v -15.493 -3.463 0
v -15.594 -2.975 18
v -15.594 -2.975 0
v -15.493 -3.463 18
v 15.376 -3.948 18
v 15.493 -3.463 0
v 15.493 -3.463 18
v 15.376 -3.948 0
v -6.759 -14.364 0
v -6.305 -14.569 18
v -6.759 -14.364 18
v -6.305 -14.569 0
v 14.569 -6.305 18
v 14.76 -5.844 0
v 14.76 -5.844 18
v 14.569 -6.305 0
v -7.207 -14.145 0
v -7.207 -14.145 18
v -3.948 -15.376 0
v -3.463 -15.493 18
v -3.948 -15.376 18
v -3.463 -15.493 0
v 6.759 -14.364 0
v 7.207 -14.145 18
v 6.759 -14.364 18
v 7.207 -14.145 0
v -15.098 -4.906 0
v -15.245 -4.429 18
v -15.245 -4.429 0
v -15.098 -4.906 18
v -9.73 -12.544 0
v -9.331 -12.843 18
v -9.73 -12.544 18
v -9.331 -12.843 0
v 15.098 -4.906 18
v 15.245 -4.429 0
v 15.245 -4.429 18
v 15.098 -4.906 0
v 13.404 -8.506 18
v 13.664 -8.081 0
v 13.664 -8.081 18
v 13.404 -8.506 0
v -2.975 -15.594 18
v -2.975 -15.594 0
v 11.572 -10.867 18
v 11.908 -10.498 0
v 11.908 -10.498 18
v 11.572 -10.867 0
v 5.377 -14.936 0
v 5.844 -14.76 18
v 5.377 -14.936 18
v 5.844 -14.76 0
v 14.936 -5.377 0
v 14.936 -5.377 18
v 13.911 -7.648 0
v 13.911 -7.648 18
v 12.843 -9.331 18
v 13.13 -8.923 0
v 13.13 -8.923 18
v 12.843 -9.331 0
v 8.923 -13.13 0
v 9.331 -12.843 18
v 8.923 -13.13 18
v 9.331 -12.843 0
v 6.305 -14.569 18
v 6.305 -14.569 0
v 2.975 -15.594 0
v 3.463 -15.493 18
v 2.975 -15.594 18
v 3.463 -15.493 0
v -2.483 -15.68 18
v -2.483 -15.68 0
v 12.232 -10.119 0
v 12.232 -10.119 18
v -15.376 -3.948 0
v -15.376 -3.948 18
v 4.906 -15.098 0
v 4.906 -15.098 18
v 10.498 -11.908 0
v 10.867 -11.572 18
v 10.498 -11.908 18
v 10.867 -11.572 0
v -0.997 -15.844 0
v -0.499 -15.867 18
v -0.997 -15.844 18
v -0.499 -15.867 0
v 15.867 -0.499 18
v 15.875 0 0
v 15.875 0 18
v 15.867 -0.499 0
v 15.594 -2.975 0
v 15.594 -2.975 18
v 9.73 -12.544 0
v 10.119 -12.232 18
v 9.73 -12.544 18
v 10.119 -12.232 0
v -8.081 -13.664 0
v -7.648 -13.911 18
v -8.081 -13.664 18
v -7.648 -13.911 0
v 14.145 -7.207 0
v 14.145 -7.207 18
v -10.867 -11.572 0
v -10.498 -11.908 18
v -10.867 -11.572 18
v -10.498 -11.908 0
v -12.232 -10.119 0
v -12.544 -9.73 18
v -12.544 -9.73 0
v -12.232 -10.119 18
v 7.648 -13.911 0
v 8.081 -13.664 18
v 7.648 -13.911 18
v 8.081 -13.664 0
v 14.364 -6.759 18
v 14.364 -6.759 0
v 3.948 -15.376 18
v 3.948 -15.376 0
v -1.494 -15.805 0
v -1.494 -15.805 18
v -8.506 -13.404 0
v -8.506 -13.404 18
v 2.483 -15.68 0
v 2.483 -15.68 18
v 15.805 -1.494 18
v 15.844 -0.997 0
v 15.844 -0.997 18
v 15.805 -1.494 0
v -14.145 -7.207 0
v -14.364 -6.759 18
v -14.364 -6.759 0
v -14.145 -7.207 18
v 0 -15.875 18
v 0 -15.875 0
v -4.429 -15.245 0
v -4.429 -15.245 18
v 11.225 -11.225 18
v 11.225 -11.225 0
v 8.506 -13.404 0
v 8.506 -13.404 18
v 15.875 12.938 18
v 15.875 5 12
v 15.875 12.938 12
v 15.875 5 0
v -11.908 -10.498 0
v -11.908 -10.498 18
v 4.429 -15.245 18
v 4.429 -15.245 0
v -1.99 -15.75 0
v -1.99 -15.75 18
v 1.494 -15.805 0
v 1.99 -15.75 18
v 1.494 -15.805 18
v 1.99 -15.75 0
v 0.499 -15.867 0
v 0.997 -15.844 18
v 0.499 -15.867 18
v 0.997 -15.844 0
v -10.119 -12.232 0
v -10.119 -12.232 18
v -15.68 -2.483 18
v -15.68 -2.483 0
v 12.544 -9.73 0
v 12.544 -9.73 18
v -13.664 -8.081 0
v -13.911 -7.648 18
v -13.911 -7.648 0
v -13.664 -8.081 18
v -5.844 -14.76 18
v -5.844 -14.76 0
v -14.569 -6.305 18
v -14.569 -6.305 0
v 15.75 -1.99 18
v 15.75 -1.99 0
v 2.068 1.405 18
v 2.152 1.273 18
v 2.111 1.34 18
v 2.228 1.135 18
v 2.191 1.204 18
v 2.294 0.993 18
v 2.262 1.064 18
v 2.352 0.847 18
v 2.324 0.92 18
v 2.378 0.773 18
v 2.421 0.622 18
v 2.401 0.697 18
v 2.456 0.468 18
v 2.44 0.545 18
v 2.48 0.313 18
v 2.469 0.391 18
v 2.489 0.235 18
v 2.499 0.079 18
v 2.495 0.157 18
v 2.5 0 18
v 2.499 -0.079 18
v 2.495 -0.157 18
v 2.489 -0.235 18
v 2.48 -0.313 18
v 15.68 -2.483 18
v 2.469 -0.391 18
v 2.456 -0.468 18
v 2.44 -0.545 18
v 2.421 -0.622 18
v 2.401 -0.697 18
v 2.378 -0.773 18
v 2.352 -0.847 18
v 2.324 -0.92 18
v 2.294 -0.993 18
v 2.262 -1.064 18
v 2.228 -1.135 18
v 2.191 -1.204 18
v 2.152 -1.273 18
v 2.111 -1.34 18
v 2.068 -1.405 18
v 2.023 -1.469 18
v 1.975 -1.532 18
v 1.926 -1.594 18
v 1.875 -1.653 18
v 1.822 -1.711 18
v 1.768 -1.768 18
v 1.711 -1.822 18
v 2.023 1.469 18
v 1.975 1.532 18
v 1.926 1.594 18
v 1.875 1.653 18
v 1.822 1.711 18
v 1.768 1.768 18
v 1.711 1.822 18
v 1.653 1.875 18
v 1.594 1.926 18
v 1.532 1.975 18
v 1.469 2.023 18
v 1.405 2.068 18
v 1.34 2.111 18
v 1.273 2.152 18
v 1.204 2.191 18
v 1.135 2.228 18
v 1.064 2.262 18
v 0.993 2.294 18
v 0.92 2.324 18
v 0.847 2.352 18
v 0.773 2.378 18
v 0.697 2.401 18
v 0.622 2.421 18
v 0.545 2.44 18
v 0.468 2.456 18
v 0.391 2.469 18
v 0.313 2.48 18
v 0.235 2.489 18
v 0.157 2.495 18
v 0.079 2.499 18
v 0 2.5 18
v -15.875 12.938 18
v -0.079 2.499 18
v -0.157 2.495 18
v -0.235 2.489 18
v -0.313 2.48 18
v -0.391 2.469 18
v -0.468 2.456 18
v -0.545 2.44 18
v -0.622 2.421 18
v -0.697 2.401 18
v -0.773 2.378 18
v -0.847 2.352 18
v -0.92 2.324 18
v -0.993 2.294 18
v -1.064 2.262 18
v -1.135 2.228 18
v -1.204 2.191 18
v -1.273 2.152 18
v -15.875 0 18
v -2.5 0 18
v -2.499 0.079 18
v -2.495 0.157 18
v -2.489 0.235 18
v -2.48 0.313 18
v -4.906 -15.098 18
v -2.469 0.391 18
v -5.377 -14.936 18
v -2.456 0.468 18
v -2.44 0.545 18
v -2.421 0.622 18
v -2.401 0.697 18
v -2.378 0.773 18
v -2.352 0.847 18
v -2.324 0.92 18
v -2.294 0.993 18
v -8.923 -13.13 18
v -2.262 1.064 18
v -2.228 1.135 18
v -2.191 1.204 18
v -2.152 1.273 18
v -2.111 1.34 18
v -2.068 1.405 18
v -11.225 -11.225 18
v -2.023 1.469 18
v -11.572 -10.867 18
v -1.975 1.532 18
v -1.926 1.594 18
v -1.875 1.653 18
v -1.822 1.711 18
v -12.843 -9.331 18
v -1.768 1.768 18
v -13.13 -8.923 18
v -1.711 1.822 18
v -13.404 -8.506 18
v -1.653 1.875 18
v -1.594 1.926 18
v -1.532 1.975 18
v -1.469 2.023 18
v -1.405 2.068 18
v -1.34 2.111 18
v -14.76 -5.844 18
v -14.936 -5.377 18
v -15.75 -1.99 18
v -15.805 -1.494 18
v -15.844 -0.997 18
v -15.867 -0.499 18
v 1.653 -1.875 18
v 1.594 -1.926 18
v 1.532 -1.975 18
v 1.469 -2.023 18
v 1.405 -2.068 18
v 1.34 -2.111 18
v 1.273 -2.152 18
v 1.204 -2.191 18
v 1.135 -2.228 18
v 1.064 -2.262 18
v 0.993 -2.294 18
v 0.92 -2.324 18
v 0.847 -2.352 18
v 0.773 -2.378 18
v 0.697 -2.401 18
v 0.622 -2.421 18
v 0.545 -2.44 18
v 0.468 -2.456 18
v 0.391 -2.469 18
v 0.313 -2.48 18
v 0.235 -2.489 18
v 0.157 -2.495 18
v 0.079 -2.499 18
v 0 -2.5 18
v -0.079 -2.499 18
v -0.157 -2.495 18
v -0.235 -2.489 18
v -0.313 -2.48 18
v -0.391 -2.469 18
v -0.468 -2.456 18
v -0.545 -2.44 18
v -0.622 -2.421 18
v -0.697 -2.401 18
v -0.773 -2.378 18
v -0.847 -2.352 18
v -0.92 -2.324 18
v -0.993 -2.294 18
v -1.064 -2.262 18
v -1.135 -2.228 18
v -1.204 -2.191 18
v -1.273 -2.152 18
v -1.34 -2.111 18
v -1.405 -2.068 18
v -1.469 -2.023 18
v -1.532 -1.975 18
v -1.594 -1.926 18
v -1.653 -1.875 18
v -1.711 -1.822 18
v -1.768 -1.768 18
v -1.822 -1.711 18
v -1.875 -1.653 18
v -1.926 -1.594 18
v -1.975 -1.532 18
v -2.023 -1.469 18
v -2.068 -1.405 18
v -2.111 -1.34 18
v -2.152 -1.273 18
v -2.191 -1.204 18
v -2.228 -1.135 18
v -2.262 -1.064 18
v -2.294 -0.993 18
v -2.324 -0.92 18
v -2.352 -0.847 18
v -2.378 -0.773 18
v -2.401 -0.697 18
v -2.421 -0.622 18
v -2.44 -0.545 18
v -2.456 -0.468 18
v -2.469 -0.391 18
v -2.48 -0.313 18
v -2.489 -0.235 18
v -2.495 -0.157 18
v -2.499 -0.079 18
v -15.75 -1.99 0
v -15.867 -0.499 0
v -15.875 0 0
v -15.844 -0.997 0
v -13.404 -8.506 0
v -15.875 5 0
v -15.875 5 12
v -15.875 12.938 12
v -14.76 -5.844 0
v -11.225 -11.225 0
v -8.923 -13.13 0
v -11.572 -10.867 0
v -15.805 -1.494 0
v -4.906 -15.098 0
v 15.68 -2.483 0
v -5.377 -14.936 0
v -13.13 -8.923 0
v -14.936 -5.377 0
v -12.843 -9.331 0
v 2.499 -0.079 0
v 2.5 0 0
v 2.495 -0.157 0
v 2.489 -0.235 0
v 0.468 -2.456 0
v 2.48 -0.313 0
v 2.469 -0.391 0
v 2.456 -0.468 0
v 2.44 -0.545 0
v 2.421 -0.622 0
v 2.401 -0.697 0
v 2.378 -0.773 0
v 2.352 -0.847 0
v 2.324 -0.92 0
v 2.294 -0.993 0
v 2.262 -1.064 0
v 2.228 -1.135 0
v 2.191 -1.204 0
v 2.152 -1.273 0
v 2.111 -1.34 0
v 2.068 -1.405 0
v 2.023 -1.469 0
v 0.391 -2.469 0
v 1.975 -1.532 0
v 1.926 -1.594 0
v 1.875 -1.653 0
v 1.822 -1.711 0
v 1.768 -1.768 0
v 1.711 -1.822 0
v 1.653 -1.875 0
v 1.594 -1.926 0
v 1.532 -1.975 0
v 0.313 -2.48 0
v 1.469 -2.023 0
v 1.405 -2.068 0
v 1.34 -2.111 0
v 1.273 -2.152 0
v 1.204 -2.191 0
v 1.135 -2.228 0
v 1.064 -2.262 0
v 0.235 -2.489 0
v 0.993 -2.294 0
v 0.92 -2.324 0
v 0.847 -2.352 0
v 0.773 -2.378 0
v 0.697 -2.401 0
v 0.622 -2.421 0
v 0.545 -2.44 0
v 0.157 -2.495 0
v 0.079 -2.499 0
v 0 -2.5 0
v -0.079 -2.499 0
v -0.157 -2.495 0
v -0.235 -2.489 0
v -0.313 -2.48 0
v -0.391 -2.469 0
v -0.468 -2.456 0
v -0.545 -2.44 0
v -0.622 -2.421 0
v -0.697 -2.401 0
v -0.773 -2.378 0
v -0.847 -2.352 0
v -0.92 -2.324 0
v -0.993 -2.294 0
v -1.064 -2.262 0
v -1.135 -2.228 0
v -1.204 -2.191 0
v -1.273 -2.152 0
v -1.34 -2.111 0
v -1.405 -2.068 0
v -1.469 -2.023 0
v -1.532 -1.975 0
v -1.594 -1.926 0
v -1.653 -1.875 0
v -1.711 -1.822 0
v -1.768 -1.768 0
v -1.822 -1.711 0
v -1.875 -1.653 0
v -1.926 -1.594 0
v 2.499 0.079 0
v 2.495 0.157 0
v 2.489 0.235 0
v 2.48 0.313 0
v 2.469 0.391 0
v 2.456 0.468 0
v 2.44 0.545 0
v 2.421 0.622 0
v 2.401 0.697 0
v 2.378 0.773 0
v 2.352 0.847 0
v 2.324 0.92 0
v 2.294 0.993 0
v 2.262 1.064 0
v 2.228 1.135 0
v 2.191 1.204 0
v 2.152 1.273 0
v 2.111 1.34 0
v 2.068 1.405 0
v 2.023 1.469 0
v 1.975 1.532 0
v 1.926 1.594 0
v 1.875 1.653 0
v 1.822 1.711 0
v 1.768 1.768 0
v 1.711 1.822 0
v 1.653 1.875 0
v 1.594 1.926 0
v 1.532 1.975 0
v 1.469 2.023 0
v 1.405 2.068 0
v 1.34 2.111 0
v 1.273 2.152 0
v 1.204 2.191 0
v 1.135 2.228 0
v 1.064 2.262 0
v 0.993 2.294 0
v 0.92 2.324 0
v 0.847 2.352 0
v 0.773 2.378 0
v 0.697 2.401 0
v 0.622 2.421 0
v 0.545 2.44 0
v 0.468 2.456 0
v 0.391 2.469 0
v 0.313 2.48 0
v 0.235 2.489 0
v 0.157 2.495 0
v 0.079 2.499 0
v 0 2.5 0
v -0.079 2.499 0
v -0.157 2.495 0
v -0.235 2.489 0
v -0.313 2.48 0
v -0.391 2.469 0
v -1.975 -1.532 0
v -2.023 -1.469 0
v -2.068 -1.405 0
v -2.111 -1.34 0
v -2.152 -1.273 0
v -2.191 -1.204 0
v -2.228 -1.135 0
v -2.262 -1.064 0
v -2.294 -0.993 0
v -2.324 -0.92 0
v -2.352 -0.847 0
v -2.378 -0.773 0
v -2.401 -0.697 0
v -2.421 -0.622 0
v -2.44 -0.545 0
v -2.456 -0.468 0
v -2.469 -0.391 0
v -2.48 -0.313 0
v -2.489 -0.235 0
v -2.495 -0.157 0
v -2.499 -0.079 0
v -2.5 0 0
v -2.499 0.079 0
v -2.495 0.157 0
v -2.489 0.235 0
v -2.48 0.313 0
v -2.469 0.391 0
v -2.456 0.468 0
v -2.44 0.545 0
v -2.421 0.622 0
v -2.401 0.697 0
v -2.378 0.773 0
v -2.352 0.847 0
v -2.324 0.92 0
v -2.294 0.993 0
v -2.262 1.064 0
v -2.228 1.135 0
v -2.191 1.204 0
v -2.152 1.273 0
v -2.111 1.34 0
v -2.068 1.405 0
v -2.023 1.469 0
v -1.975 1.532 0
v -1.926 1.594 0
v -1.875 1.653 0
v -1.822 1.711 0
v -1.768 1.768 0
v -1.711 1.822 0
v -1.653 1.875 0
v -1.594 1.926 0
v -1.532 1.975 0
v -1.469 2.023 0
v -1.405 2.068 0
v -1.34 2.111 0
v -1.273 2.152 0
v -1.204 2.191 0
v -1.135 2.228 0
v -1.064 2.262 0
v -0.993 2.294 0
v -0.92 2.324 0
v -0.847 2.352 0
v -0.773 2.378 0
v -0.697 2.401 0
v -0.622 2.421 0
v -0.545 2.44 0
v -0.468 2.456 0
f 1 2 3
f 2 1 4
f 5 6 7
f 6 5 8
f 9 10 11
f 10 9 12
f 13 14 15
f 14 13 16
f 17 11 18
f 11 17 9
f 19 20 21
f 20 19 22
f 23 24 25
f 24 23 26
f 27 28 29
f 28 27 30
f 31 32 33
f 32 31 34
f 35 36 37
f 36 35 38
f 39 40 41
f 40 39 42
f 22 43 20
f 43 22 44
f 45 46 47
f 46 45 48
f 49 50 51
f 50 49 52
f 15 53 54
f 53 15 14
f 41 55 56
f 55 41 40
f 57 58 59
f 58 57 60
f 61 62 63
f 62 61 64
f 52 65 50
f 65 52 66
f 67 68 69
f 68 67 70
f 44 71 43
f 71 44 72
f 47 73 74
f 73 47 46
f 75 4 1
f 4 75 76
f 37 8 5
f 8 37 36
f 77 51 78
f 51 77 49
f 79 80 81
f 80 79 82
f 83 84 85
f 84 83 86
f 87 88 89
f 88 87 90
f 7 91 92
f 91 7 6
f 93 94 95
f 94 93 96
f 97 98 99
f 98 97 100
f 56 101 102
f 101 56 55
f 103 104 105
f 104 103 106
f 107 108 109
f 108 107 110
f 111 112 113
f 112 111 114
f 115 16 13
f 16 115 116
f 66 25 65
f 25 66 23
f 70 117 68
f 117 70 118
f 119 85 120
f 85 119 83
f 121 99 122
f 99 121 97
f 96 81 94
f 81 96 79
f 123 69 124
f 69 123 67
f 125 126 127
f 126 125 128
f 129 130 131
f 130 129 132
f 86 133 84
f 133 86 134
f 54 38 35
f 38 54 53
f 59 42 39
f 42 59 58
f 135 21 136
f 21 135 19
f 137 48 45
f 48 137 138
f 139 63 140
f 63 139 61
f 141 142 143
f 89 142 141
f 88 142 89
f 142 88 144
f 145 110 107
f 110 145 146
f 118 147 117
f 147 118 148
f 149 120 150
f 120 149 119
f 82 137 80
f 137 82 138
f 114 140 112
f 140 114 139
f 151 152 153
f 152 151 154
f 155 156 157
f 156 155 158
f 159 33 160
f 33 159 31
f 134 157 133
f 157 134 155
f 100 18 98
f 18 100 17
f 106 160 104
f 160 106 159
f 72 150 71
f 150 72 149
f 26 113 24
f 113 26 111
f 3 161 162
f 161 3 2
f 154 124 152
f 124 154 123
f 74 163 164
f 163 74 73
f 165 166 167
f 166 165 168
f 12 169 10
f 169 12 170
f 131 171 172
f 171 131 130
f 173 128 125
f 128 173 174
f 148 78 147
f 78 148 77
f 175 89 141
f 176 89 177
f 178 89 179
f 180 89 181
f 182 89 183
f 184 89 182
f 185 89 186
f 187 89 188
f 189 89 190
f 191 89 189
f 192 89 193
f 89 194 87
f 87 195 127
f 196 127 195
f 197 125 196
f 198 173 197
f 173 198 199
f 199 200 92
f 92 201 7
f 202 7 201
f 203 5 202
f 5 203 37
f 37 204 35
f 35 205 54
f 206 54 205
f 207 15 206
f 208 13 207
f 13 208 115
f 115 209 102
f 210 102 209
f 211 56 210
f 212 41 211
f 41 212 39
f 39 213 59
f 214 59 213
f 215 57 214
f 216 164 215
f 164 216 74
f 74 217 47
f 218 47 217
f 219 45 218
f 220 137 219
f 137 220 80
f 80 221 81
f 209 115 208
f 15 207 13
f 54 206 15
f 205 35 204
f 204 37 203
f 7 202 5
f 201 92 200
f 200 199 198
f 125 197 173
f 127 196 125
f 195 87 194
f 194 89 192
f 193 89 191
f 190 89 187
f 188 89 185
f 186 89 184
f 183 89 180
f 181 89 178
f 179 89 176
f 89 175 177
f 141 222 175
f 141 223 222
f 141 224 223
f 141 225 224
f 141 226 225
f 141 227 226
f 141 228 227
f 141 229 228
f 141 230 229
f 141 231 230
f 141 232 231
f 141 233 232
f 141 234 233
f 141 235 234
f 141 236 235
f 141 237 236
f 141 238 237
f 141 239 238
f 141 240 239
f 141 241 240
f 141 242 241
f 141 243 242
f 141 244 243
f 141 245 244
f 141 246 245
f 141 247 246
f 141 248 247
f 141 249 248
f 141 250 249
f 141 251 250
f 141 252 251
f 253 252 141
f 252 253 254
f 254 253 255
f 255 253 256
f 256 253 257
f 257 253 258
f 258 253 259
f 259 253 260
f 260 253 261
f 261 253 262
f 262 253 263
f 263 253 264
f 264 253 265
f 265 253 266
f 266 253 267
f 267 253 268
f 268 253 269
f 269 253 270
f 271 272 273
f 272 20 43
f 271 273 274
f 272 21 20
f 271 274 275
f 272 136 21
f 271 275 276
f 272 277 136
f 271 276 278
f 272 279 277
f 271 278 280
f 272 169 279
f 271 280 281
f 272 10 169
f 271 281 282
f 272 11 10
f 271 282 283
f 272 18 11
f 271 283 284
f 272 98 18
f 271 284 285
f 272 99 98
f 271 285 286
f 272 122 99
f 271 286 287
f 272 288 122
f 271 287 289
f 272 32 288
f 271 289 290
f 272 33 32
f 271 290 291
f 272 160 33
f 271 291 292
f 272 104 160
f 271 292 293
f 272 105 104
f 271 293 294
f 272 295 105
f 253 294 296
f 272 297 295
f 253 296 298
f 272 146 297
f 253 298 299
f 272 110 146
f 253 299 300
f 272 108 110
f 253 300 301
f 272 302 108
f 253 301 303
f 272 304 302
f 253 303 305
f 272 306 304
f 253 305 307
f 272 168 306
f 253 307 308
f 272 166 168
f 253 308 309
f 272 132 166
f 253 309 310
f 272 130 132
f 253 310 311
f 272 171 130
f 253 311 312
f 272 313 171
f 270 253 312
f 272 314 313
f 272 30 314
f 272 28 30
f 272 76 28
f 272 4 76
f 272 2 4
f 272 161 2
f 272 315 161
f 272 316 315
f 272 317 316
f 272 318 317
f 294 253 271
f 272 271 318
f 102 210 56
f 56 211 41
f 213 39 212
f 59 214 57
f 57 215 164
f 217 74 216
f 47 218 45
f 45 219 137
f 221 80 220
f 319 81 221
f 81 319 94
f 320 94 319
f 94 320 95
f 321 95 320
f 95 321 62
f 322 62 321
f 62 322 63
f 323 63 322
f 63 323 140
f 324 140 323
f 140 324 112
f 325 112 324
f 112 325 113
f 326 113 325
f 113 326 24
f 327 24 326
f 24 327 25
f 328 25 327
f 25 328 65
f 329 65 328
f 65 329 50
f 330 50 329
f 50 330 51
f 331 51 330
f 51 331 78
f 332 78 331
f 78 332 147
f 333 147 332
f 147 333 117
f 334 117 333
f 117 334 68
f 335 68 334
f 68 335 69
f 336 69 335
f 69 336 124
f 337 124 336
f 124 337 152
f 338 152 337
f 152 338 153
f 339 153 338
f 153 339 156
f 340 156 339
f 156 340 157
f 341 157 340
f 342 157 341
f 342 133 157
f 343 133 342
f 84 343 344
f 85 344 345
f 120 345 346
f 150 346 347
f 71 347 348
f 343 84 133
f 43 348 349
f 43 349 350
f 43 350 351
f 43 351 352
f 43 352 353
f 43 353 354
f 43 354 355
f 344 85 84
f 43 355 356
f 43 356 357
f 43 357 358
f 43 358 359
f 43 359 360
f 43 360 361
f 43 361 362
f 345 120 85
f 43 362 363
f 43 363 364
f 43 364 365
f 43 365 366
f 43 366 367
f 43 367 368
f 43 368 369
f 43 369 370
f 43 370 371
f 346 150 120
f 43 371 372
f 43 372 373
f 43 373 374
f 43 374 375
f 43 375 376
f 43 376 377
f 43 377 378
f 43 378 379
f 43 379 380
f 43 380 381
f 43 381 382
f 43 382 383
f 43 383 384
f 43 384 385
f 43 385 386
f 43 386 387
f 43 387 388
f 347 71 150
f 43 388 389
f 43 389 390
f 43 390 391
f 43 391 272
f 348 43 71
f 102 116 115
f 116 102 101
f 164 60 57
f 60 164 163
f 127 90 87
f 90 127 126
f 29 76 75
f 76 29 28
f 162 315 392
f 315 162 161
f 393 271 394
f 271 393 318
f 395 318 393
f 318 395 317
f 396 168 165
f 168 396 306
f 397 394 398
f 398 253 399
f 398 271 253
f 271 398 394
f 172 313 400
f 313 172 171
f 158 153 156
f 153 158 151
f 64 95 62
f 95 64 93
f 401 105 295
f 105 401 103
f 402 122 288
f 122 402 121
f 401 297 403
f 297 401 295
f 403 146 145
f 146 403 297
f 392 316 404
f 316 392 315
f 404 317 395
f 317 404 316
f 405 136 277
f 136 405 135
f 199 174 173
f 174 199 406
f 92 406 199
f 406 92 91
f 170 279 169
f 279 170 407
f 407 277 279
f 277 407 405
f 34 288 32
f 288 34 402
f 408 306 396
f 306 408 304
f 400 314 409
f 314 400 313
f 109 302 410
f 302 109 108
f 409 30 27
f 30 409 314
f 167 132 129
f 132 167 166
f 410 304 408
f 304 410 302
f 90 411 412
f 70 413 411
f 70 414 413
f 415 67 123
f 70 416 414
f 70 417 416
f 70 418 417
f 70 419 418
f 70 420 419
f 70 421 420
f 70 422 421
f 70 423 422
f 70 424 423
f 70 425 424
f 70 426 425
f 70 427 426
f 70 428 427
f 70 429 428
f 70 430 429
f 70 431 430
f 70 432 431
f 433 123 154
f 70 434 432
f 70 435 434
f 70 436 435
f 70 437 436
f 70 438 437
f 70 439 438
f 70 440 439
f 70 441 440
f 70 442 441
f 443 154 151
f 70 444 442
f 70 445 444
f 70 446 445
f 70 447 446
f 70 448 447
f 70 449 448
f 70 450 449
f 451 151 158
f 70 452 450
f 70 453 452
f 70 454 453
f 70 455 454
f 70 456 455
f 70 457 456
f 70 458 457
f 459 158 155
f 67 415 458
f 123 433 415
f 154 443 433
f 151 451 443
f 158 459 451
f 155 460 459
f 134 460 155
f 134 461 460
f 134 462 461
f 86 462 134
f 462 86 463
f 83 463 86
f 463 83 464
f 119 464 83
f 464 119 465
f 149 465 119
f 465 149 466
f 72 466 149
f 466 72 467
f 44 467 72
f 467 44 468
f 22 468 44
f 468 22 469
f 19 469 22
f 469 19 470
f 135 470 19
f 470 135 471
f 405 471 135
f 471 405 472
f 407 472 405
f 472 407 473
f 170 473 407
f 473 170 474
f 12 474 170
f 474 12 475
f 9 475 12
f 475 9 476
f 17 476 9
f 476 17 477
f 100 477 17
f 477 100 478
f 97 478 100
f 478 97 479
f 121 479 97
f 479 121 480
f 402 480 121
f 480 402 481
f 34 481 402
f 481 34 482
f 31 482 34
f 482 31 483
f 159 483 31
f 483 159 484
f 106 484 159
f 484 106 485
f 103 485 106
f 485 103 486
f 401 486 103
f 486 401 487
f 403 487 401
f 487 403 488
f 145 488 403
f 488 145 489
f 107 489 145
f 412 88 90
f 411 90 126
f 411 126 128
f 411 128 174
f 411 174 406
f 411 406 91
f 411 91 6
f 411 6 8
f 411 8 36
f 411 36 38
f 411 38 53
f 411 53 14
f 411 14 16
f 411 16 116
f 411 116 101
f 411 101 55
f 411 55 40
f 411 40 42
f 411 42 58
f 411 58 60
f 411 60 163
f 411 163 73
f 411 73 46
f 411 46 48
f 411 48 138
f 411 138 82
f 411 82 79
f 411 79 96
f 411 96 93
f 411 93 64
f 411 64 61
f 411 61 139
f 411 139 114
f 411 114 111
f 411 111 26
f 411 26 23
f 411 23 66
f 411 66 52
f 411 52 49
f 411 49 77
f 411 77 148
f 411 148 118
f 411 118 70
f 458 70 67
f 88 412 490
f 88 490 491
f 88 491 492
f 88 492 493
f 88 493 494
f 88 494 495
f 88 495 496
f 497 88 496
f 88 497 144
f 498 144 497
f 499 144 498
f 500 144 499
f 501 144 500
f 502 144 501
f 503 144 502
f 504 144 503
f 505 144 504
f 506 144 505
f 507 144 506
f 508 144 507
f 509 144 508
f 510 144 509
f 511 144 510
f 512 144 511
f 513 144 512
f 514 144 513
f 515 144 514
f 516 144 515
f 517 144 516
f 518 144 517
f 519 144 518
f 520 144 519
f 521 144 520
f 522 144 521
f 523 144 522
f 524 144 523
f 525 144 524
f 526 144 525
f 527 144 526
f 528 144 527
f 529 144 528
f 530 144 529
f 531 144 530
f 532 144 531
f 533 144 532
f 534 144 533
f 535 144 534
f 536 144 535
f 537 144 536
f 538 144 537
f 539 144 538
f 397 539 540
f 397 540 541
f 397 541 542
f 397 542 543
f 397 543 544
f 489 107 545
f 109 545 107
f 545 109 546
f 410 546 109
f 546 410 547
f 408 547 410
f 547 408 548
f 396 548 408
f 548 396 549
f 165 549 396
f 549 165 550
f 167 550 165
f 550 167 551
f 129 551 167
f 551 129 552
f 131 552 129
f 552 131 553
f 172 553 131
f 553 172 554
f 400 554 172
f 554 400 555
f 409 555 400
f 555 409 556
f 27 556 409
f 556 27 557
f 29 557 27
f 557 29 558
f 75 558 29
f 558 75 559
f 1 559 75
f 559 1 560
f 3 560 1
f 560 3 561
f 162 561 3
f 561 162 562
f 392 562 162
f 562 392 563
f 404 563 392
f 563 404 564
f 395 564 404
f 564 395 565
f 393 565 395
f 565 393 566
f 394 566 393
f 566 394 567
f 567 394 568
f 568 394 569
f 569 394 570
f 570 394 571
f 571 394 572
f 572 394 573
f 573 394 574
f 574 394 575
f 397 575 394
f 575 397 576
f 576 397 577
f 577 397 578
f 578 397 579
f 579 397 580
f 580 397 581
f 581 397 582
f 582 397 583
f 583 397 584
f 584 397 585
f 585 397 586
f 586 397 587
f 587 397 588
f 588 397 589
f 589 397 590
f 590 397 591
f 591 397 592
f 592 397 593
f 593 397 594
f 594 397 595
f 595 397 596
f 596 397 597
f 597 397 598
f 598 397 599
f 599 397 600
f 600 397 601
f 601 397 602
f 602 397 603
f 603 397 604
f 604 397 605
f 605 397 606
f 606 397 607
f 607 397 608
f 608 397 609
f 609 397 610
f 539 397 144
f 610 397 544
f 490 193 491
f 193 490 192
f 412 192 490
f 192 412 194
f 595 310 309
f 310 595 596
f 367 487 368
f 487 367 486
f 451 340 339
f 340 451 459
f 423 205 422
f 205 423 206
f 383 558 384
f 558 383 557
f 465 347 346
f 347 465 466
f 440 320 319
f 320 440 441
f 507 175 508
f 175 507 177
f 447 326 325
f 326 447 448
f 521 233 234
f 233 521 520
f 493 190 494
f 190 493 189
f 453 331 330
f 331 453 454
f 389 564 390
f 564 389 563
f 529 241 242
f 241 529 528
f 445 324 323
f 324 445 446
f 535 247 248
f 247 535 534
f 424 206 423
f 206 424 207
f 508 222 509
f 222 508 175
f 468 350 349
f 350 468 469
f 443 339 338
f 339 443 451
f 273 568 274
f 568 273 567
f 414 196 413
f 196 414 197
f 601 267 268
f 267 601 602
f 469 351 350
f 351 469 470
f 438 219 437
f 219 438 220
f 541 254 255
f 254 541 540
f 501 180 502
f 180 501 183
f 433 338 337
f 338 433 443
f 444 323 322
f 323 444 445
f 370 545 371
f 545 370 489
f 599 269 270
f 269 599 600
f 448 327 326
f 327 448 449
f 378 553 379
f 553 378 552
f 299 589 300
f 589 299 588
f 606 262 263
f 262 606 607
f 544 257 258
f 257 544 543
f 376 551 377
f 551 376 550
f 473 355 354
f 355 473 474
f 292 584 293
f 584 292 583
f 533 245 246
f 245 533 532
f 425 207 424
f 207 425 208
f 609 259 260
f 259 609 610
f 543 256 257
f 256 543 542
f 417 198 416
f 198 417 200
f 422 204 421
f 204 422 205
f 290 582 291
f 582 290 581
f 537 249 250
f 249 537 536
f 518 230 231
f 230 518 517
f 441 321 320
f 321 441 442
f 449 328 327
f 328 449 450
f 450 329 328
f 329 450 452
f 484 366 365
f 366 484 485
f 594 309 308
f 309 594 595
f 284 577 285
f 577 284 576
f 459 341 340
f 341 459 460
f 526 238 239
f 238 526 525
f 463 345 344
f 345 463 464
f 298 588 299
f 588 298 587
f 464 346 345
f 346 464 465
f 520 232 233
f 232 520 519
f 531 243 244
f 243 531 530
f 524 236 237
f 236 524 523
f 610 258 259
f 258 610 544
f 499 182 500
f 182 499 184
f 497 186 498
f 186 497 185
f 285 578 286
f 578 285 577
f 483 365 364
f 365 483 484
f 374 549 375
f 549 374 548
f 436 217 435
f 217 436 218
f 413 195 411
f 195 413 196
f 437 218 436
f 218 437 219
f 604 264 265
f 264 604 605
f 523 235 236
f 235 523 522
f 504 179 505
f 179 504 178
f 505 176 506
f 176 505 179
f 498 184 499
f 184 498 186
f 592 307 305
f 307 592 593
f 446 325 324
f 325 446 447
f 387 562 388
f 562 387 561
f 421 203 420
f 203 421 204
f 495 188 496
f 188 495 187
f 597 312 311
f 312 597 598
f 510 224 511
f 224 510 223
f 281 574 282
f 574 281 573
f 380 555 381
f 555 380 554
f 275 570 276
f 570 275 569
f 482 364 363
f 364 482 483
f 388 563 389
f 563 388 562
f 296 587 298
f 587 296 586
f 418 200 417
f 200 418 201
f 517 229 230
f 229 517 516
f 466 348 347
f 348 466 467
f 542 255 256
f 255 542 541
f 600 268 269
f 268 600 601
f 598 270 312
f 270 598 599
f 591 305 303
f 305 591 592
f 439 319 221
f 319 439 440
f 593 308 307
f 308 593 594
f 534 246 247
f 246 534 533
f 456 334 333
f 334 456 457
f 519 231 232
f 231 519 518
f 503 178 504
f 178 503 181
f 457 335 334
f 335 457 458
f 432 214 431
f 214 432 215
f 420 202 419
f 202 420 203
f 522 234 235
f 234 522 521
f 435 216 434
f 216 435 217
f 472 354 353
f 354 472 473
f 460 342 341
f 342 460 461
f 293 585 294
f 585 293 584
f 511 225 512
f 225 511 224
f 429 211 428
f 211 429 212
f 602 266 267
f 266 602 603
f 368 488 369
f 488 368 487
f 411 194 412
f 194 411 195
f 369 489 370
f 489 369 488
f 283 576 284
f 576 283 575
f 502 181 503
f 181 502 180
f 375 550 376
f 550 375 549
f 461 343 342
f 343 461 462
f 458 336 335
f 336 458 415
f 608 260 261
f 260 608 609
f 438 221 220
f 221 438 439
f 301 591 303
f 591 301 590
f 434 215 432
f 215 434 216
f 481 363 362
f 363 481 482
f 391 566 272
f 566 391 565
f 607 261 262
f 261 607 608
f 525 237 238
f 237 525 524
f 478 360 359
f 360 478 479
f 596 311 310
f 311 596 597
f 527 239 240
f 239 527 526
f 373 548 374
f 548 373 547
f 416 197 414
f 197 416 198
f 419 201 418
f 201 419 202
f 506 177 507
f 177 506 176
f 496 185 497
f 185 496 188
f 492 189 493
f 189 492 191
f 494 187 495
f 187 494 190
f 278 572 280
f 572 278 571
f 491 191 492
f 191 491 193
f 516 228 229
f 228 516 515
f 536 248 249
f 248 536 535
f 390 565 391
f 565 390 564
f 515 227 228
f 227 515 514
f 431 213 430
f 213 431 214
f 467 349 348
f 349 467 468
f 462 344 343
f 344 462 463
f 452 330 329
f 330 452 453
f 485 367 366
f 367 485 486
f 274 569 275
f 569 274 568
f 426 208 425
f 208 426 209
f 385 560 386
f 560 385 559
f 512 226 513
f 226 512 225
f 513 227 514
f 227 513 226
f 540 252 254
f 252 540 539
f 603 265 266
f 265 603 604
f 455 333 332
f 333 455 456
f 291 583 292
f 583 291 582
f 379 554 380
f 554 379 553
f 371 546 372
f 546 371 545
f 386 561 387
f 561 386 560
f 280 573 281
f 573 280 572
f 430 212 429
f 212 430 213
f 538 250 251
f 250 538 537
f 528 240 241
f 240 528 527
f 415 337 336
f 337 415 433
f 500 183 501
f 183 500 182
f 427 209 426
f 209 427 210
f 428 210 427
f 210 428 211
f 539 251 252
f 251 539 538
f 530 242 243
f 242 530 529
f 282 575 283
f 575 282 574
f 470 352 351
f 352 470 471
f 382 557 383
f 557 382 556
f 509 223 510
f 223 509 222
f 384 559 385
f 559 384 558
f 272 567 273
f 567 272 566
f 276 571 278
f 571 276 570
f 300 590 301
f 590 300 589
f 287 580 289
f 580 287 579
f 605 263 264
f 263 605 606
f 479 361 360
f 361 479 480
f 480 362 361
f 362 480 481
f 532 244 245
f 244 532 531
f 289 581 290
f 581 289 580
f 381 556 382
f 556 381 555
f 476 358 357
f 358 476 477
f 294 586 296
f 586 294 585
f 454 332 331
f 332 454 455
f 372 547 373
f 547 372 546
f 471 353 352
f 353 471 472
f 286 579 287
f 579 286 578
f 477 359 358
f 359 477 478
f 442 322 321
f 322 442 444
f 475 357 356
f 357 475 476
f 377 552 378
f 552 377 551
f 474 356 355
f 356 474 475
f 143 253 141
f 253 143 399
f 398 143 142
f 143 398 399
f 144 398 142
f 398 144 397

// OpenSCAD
screw=5;
width=1.25*25.4;
beam_height=12;
lip_height=beam_height/2;

height=lip_height+beam_height;
lip=width/4;

screw_offset=5;
pad=0.1;
$fn=200;

difference() {
	hull() {
		translate([0,lip+screw_offset])
		cylinder(d=width,h=height);
		cylinder(d=width,h=height);
	}
	translate([0,0,-pad])
	cylinder(d=screw,h=height+pad*2);

	translate([-width/2-pad,screw_offset+lip,-pad])
	cube([width+pad*2,width*2,height+pad*2]);

	translate([-width/2-pad,screw_offset,-pad])
	cube([width+pad*2,width*2,beam_height+pad]);
	
}
